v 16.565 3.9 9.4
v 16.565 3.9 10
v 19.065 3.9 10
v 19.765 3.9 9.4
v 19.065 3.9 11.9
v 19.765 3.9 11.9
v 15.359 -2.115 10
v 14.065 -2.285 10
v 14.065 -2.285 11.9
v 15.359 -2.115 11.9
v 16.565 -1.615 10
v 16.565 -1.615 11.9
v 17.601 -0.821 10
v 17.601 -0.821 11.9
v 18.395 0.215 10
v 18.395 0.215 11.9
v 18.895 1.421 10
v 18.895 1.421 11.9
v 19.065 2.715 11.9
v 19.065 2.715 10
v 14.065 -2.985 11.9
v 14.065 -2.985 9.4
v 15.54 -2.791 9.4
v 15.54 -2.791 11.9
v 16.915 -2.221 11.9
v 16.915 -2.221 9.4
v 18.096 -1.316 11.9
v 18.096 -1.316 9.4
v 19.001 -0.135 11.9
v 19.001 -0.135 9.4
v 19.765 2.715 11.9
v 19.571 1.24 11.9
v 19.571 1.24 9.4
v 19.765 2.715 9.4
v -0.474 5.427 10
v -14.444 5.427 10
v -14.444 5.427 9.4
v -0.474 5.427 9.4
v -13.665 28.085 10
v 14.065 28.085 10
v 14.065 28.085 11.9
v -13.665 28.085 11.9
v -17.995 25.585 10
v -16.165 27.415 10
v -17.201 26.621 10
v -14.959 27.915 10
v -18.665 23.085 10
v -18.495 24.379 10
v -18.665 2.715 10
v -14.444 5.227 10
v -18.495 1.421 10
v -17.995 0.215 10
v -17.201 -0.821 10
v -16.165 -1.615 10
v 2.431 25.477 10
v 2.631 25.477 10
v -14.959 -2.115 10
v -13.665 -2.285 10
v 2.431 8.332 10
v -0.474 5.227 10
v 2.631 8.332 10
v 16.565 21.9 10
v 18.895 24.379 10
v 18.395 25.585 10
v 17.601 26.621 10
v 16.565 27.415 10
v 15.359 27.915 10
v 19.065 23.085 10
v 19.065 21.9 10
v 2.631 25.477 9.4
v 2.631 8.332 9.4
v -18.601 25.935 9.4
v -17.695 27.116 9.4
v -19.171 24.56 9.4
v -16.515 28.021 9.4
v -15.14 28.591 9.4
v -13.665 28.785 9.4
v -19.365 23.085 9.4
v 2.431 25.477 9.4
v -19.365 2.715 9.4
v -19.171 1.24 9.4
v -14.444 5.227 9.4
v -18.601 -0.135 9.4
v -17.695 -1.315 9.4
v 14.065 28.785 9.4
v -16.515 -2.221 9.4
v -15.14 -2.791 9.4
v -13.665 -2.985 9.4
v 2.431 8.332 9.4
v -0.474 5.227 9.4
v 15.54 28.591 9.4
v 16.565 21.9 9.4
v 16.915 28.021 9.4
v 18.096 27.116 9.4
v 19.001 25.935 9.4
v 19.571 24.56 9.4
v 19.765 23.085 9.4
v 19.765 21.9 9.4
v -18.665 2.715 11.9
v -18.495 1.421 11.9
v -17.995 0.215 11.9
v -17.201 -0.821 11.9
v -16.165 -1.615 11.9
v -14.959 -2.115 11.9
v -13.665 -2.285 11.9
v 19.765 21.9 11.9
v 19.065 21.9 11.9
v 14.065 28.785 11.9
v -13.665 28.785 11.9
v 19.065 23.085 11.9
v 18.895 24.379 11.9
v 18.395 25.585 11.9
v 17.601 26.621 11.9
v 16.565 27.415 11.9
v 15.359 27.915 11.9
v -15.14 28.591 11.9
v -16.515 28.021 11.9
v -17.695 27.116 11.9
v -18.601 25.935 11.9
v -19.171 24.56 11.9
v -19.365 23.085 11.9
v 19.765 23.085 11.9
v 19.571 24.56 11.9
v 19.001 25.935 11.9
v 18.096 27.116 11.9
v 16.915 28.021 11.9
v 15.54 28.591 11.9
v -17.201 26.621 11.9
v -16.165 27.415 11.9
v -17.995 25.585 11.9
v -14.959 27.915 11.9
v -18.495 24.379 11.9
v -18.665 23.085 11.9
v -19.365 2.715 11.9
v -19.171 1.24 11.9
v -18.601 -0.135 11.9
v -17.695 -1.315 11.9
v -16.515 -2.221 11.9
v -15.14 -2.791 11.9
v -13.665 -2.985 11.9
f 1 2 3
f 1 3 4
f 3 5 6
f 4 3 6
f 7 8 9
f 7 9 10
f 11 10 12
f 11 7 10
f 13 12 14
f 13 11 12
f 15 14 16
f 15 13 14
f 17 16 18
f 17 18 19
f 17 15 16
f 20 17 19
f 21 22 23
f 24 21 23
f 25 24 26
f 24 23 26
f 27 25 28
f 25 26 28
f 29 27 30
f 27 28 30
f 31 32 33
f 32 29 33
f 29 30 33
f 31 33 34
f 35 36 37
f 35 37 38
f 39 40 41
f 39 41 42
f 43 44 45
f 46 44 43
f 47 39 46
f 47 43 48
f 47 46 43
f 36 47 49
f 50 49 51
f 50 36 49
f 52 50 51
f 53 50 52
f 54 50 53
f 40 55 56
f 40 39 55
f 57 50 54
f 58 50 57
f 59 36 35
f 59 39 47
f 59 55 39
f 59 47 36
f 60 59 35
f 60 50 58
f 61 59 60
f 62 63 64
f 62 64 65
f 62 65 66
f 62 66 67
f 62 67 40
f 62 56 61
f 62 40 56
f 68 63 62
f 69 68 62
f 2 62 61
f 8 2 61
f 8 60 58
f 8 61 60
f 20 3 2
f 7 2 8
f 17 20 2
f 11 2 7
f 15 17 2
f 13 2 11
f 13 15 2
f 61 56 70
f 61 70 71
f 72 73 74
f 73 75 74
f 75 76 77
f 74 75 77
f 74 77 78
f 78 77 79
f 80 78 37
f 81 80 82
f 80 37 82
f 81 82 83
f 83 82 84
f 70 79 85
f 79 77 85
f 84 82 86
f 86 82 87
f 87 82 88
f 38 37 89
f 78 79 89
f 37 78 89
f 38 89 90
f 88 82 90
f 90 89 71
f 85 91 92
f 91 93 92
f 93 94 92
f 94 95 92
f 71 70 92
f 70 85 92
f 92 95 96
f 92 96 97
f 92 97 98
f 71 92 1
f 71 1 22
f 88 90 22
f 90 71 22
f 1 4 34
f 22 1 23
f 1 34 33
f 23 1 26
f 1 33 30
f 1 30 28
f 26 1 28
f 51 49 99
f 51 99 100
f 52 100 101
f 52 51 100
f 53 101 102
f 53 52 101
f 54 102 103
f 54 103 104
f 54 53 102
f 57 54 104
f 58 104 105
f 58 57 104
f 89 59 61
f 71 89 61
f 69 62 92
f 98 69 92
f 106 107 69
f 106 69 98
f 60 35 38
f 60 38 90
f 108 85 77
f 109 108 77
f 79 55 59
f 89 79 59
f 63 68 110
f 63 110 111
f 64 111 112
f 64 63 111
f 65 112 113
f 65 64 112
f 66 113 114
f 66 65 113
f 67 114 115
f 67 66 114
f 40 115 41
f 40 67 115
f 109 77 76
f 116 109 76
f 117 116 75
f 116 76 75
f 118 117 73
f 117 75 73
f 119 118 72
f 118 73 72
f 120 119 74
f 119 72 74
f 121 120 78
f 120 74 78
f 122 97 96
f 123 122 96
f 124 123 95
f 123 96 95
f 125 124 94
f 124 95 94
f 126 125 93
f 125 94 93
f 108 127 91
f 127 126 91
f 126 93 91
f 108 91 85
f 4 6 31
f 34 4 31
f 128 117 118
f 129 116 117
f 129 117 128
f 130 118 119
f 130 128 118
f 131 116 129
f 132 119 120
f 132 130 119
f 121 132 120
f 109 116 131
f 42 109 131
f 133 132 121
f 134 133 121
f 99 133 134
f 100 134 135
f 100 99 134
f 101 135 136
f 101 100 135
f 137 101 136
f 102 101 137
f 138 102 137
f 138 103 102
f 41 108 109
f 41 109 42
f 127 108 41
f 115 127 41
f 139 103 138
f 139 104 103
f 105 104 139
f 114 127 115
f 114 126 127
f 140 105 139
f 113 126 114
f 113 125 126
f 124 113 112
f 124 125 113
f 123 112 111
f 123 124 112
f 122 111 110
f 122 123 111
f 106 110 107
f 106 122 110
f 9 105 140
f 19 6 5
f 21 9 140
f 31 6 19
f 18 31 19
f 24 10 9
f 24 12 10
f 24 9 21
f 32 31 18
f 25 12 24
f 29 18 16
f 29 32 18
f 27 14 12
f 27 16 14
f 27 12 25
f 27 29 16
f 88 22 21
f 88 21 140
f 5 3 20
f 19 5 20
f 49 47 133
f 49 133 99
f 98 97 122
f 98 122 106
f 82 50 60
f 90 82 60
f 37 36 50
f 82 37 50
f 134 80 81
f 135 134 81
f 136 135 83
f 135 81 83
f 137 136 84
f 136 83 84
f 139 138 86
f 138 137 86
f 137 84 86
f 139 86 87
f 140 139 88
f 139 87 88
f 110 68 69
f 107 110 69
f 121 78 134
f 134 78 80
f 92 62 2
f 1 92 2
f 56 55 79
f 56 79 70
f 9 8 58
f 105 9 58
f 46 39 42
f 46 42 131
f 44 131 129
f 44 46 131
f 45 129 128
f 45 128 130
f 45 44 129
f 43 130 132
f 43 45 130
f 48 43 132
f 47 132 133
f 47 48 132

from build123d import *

# Parameters (mm, degrees)
PAD_DEPTH            = 1.9
THICKNESS_T          = 0.7
SKETCH001_W          = 18
SKETCH001_H          = 3
POCKET_DEPTH         = 1
POCKET_DEPTH_BACK    = 5
POCKET001_START      = -0.6
SKETCH002_W          = 49.648089
SKETCH002_H          = 49.770681
POCKET001_DEPTH      = 1.4
SKETCH011_W          = 18
SKETCH011_H          = 0.8
POCKET005_DEPTH      = 2.5
SKETCH035_W          = 17.144912
SKETCH035_H          = 0.2
SKETCH035_W_2        = 0.2
SKETCH035_H_2        = 13.969912
POCKET015_DEPTH      = 5
BODY_PLACEMENT_ANGLE = 270


with BuildPart() as part:
    # Sketch → Pad (new body)
    with BuildSketch(Plane.XY):
        with BuildLine():
            Line((-15.185, 13.864998), (-15.185, -13.864986))
            ThreePointArc((-15.185, -13.864986), (-13.720534, -17.40052), (-10.185, -18.864986))
            Line((-10.185, -18.864986), (10.184984, -18.864986))
            ThreePointArc((10.184984, -18.864986), (13.720524, -17.400521), (15.185, -13.864986))
            Line((15.185, 13.864998), (15.185, -13.864986))
            ThreePointArc((15.185, 13.864998), (13.720535, 17.400537), (10.185, 18.865014))
            Line((-10.184984, 18.865014), (10.185, 18.865014))
            ThreePointArc((-10.184984, 18.865014), (-13.720529, 17.400543), (-15.185, 13.864998))
        make_face()
    extrude(amount=PAD_DEPTH)

    # Thickness
    thickness_openings = [part.faces().sort_by_distance(p)[0] for p in [
        (0, 1.3e-05, 1.9),
    ]]
    offset(amount=THICKNESS_T, openings=thickness_openings, kind=Kind.INTERSECTION)

    # Sketch001 → Pocket (cut, two sides)
    with BuildSketch(Plane.XY) as pocket_sk:
        with Locations((0, 17.865014)):
            Rectangle(SKETCH001_W, SKETCH001_H)
    extrude(amount=POCKET_DEPTH, mode=Mode.SUBTRACT)
    extrude(pocket_sk.sketch, amount=-POCKET_DEPTH_BACK, mode=Mode.SUBTRACT)

    # Sketch002 → Pocket001 (cut)
    with BuildSketch(Plane.XY.offset(POCKET001_START)):
        with Locations((-0.449389, 1.150265)):
            Rectangle(SKETCH002_W, SKETCH002_H)
    extrude(amount=-POCKET001_DEPTH, mode=Mode.SUBTRACT)

    # Sketch011 → Pocket005 (cut, symmetric)
    with BuildSketch(Plane.XY):
        with Locations((0, 19.265014)):
            Rectangle(SKETCH011_W, SKETCH011_H)
    extrude(amount=POCKET005_DEPTH, both=True, mode=Mode.SUBTRACT)

    # Sketch035 → Pocket015 (cut)
    with BuildSketch(Plane.XY):
        with Locations((-4.004159, 2.3314)):
            Rectangle(SKETCH035_W, SKETCH035_H)
        with Locations((7.573341, -7.6586)):
            Rectangle(SKETCH035_W_2, SKETCH035_H_2)
    extrude(amount=-POCKET015_DEPTH, mode=Mode.SUBTRACT)


with BuildPart() as part_1:
    # Body placement: moved
    add(part.part.moved(Location((0.2, 12.9, 10))).rotate(Axis((0.2, 12.9, 10), (0, 0, 1)), BODY_PLACEMENT_ANGLE))


solid = part_1.part
